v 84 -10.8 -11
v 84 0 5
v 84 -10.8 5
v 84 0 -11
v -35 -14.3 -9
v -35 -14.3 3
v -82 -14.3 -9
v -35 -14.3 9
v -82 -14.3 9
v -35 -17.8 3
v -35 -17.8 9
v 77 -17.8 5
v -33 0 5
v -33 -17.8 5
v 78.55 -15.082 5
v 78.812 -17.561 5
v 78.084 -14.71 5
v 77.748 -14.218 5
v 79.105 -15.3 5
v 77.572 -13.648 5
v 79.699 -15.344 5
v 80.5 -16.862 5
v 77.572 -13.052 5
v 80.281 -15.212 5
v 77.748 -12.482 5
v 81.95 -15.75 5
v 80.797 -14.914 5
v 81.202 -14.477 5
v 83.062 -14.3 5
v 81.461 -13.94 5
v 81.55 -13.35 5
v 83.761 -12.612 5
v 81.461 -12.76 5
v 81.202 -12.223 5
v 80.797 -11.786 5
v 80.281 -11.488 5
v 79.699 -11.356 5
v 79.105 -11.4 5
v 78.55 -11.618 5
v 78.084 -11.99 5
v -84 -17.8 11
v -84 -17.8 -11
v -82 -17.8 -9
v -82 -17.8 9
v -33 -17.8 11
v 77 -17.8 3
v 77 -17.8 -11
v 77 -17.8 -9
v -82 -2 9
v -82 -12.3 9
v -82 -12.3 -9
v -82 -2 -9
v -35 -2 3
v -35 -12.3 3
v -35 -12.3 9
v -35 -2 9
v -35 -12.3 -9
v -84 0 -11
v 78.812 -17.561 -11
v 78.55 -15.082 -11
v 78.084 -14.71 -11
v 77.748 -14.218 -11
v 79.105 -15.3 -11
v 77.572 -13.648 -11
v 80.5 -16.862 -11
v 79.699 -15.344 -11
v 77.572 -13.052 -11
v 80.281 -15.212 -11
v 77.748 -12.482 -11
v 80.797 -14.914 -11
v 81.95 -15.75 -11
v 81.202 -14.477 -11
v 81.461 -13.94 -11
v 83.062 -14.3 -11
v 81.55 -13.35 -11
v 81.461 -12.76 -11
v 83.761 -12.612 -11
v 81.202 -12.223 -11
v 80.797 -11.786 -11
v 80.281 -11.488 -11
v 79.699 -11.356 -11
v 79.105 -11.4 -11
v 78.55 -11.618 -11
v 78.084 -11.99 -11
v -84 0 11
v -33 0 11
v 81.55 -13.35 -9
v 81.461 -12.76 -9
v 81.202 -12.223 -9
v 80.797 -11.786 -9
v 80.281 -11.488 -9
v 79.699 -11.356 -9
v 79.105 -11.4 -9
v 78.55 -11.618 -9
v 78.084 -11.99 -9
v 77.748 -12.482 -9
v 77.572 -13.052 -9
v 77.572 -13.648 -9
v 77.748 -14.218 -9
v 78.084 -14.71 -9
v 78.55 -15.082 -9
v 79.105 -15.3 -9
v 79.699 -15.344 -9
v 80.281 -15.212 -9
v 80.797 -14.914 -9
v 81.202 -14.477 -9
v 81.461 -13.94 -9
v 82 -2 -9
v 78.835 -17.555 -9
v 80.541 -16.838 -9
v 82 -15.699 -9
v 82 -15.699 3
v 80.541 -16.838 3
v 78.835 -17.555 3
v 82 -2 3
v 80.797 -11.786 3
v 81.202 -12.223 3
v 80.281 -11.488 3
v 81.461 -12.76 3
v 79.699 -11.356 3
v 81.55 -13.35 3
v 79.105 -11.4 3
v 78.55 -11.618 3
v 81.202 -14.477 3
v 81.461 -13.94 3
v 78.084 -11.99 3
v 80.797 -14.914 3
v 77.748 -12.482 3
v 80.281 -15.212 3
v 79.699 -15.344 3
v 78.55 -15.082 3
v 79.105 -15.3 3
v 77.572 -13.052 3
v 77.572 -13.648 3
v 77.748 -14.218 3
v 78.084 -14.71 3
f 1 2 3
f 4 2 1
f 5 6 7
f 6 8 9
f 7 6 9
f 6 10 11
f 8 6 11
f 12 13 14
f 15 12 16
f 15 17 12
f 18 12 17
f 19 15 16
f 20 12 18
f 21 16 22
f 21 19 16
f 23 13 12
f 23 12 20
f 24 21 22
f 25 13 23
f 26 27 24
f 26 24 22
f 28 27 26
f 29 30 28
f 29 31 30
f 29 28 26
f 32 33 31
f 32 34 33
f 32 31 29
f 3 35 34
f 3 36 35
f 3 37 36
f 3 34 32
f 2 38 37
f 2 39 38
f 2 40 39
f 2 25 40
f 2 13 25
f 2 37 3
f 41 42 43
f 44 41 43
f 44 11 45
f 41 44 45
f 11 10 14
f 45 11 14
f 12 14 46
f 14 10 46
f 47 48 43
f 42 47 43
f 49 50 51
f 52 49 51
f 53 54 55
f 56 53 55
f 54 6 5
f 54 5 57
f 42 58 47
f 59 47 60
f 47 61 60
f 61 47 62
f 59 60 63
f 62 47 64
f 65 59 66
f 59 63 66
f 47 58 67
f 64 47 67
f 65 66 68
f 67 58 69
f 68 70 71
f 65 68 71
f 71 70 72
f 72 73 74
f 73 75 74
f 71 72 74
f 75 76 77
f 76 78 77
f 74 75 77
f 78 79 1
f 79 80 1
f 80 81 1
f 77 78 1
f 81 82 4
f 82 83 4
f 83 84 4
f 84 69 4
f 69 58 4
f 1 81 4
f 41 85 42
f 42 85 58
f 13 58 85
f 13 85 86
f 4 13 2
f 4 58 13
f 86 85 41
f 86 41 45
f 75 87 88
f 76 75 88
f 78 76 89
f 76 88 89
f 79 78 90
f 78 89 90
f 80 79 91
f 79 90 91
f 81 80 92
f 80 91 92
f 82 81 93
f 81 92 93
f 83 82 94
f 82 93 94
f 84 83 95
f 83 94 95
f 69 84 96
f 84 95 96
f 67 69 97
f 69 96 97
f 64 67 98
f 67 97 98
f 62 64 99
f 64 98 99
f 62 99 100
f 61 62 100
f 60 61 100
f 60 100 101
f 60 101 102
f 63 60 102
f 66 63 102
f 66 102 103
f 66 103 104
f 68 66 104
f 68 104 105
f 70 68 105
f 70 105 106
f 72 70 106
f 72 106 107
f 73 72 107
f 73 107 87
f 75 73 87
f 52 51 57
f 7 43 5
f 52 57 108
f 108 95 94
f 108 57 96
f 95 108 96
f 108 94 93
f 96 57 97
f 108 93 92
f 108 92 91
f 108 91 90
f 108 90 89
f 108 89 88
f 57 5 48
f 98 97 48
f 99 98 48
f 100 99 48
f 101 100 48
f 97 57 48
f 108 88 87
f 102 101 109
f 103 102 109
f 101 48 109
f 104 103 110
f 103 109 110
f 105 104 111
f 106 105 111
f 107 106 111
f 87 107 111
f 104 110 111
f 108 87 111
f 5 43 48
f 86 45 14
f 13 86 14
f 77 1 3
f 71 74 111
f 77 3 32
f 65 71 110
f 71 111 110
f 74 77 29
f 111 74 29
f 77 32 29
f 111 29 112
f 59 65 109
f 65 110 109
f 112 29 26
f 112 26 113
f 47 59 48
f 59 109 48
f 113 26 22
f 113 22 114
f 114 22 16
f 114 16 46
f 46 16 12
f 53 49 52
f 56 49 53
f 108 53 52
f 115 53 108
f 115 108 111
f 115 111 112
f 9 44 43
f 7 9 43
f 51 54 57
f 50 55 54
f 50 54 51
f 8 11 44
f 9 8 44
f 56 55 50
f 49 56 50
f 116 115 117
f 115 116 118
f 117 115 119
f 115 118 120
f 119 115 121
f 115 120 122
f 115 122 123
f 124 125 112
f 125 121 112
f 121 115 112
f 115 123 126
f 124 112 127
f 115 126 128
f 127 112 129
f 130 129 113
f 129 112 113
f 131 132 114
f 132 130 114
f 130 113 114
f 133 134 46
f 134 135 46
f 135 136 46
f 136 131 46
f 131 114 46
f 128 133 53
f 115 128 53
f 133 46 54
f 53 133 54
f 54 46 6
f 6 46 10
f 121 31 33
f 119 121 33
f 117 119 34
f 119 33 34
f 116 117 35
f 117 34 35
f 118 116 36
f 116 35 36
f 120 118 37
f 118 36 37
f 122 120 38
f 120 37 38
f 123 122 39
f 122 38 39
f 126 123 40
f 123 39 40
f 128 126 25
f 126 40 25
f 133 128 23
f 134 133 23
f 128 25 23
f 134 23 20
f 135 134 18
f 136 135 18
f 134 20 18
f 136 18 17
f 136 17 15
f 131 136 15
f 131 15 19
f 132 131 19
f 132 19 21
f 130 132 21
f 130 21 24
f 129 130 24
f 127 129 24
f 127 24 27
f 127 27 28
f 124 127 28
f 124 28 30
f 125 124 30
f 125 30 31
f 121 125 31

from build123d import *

# Parameters (mm, degrees)
SKETCH1_W           = 168
SKETCH1_H           = 22
BOSS_EXTRUDE1_DEPTH = 17.8
SKETCH8_R           = 2
CUT_EXTRUDE4_DEPTH  = 22
CUT_EXTRUDE2_REACH  = 88.567
SKETCH5_W           = 117
SKETCH5_H           = 6
CUT_EXTRUDE3_DEPTH  = 15.8
BOSS_EXTRUDE2_REACH = 90.164
SKETCH9_W           = 47
SKETCH9_H           = 2
FILLET1_R           = 7


with BuildPart() as part:
    # Sketch1 → Boss-Extrude1 (new body)
    with BuildSketch(Plane(origin=(0, 0, 0), x_dir=(1, 0, 0), z_dir=(0, 1, 0))):
        Rectangle(SKETCH1_W, SKETCH1_H)
    extrude(amount=-BOSS_EXTRUDE1_DEPTH)

    # Sketch8 → Cut-Extrude4 (cut)
    with BuildSketch(Plane.XY.offset(11)):
        with Locations((79.55, -13.35)):
            Circle(SKETCH8_R)
    extrude(amount=-CUT_EXTRUDE4_DEPTH, mode=Mode.SUBTRACT)

    # Cut-Extrude2: up to this face of the body (flat: up to its plane)
    cut_extrude2_end = Plane(part.part.faces().sort_by_distance((0, -17.8, 0))[0])
    # Sketch5 → Cut-Extrude2 (cut, up to the picked face)
    with BuildSketch(Plane(origin=(0, 0, 0), x_dir=(1, 0, 0), z_dir=(0, 1, 0)), mode=Mode.PRIVATE) as cut_extrude2_sk1:
        with Locations((25.5, -8)):
            Rectangle(SKETCH5_W, SKETCH5_H)
    cut_extrude2_tool1 = split(extrude(cut_extrude2_sk1.sketch, amount=-CUT_EXTRUDE2_REACH, mode=Mode.PRIVATE), bisect_by=cut_extrude2_end, keep=Keep.BOTH, mode=Mode.PRIVATE)
    add(cut_extrude2_tool1.solids().sort_by(Axis((25.5, 0, 8), (0, -1, 0)))[0], mode=Mode.SUBTRACT)

    # Sketch6 → Cut-Extrude3 (cut)
    with BuildSketch(Plane.XZ.offset(17.8)):
        Polygon((-82, 9), (-82, -9), (82, -9), (82, 3), (-35, 3), (-35, 9), align=None)
    extrude(amount=-CUT_EXTRUDE3_DEPTH, mode=Mode.SUBTRACT)

    # Boss-Extrude2: up to this face of the body (flat: up to its plane)
    boss_extrude2_end = Plane(part.part.faces().sort_by_distance((-0.387668404, -9.883187228, -9))[0])
    # Sketch9 → Boss-Extrude2 (add, up to the picked face)
    with BuildSketch(Plane(origin=(0, 0, 9), x_dir=(-1, 0, 0), z_dir=(0, 0, -1)), mode=Mode.PRIVATE) as boss_extrude2_sk1:
        with Locations((58.5, -13.3)):
            Rectangle(SKETCH9_W, SKETCH9_H)
    boss_extrude2_tool1 = split(extrude(boss_extrude2_sk1.sketch, amount=BOSS_EXTRUDE2_REACH, mode=Mode.PRIVATE), bisect_by=boss_extrude2_end, keep=Keep.BOTH, mode=Mode.PRIVATE)
    add(boss_extrude2_tool1.solids().sort_by(Axis((-58.5, -13.3, 9), (0, 0, -1)))[0])

    # Fillet1
    # the kernel refuses this fillet: 7 mm, written as the material it takes off along each edge
    with BuildSketch(Plane(origin=(84, -17.8, 22.5), x_dir=(-1, 0, 0), z_dir=(0, 0, -1))) as fillet1_piece_1:
        with BuildLine():
            CenterArc((FILLET1_R, FILLET1_R), FILLET1_R, 180, 90)
            Line((0, FILLET1_R), (0, 0))
            Line((0, 0), (FILLET1_R, 0))
        make_face()
    extrude(amount=51, mode=Mode.SUBTRACT)


solid = part.part
